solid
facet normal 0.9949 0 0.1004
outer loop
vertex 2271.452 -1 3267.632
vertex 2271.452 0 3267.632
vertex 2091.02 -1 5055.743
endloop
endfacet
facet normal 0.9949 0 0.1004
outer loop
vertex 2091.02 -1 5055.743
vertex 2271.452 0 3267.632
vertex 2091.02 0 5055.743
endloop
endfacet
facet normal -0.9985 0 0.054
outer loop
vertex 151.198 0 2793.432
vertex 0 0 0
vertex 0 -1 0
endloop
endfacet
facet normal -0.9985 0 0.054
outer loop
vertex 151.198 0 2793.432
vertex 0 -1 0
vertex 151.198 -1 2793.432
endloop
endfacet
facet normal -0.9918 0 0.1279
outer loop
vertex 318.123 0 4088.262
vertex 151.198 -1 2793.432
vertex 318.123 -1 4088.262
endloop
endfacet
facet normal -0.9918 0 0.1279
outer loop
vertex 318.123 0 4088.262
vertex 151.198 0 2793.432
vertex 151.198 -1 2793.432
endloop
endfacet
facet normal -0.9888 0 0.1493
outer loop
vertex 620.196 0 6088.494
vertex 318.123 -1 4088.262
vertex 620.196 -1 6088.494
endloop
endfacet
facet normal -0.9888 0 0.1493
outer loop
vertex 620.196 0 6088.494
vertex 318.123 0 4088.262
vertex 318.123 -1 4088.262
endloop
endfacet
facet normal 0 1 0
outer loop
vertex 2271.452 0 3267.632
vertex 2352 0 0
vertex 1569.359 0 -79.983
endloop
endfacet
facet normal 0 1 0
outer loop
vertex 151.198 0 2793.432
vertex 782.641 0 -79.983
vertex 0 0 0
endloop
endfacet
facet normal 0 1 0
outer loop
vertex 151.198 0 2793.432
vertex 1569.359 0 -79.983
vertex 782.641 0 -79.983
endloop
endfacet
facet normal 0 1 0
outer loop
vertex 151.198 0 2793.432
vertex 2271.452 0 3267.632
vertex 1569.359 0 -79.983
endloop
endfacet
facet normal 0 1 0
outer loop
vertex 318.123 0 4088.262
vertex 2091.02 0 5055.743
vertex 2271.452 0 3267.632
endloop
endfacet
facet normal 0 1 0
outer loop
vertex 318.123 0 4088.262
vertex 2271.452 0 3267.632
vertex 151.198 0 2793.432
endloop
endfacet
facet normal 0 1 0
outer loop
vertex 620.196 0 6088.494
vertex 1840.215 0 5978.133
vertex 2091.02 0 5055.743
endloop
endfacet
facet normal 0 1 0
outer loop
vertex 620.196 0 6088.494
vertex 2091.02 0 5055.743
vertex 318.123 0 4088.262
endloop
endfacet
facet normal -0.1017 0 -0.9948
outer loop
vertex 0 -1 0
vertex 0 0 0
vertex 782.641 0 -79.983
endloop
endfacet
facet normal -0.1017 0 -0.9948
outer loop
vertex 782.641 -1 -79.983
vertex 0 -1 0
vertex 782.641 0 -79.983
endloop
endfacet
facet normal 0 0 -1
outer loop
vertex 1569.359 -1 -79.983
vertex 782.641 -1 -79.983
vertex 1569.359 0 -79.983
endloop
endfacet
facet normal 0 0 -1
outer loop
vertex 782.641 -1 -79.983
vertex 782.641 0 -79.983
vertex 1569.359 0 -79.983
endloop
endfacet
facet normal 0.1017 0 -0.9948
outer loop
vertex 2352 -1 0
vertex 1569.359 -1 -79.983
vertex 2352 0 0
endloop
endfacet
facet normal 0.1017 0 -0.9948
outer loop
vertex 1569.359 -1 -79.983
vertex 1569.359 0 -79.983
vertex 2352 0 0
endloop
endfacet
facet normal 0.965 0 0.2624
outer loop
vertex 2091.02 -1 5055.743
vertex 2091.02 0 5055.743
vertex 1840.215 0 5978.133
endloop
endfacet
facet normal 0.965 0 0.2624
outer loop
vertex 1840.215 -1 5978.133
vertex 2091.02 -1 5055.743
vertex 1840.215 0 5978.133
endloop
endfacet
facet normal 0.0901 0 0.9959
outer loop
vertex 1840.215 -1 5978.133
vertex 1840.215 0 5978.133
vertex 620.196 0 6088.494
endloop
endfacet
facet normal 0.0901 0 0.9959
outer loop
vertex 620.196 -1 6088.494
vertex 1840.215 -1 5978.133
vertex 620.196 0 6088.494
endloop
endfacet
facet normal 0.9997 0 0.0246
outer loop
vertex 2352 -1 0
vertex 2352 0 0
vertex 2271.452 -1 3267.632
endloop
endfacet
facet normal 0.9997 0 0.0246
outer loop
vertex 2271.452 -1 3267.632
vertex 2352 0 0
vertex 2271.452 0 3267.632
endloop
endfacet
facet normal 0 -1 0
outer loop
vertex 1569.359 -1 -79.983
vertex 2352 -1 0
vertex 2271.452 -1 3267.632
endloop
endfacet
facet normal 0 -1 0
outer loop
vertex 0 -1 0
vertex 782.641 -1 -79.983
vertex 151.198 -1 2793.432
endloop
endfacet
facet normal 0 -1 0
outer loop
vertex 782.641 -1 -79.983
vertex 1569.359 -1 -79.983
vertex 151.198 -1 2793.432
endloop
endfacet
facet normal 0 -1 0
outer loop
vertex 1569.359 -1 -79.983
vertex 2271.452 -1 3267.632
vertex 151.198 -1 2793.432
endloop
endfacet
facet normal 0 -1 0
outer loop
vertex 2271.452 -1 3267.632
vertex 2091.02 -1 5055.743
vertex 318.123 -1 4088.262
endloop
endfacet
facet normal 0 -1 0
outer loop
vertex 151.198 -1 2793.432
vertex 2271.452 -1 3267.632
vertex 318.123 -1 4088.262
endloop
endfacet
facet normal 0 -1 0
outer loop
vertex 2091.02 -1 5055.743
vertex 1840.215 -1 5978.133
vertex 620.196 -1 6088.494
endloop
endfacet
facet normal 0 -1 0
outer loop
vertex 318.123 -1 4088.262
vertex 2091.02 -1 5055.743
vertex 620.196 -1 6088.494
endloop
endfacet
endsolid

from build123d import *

# Parameters (mm, degrees)
F3_DEPTH = 1


with BuildPart() as f3:
    # F2 (on face) → F3 (new body)
    with BuildSketch(Plane.XZ):
        with BuildLine():
            add(Edge.make_bspline(
                [(0, 0), (42.7046461039, 949.5739841818), (112.432369512, 2500.0289853407), (224.0139745837, 3496.2047652429), (468.8398802864, 5098.1421986098), (620.1964285714, 6088.4937702183)],
                knots=[0, 0, 0, 0, 0.3762966151, 0.6144133881, 1, 1, 1, 1], degree=3))
            ThreePointArc((0, 0), (1176, -90), (2352, 0))
            Line((2352, 0), (2271.4523559318, 3267.6320372779))
            Line((2271.4523559318, 3267.6320372779), (2091.0197957494, 5055.7427885473))
            Line((2091.0197957494, 5055.7427885473), (1840.2150915805, 5978.1331707745))
            Line((1840.2150915805, 5978.1331707745), (620.1964285714, 6088.4937702183))
        make_face()
    extrude(amount=F3_DEPTH)


solid = f3.part
